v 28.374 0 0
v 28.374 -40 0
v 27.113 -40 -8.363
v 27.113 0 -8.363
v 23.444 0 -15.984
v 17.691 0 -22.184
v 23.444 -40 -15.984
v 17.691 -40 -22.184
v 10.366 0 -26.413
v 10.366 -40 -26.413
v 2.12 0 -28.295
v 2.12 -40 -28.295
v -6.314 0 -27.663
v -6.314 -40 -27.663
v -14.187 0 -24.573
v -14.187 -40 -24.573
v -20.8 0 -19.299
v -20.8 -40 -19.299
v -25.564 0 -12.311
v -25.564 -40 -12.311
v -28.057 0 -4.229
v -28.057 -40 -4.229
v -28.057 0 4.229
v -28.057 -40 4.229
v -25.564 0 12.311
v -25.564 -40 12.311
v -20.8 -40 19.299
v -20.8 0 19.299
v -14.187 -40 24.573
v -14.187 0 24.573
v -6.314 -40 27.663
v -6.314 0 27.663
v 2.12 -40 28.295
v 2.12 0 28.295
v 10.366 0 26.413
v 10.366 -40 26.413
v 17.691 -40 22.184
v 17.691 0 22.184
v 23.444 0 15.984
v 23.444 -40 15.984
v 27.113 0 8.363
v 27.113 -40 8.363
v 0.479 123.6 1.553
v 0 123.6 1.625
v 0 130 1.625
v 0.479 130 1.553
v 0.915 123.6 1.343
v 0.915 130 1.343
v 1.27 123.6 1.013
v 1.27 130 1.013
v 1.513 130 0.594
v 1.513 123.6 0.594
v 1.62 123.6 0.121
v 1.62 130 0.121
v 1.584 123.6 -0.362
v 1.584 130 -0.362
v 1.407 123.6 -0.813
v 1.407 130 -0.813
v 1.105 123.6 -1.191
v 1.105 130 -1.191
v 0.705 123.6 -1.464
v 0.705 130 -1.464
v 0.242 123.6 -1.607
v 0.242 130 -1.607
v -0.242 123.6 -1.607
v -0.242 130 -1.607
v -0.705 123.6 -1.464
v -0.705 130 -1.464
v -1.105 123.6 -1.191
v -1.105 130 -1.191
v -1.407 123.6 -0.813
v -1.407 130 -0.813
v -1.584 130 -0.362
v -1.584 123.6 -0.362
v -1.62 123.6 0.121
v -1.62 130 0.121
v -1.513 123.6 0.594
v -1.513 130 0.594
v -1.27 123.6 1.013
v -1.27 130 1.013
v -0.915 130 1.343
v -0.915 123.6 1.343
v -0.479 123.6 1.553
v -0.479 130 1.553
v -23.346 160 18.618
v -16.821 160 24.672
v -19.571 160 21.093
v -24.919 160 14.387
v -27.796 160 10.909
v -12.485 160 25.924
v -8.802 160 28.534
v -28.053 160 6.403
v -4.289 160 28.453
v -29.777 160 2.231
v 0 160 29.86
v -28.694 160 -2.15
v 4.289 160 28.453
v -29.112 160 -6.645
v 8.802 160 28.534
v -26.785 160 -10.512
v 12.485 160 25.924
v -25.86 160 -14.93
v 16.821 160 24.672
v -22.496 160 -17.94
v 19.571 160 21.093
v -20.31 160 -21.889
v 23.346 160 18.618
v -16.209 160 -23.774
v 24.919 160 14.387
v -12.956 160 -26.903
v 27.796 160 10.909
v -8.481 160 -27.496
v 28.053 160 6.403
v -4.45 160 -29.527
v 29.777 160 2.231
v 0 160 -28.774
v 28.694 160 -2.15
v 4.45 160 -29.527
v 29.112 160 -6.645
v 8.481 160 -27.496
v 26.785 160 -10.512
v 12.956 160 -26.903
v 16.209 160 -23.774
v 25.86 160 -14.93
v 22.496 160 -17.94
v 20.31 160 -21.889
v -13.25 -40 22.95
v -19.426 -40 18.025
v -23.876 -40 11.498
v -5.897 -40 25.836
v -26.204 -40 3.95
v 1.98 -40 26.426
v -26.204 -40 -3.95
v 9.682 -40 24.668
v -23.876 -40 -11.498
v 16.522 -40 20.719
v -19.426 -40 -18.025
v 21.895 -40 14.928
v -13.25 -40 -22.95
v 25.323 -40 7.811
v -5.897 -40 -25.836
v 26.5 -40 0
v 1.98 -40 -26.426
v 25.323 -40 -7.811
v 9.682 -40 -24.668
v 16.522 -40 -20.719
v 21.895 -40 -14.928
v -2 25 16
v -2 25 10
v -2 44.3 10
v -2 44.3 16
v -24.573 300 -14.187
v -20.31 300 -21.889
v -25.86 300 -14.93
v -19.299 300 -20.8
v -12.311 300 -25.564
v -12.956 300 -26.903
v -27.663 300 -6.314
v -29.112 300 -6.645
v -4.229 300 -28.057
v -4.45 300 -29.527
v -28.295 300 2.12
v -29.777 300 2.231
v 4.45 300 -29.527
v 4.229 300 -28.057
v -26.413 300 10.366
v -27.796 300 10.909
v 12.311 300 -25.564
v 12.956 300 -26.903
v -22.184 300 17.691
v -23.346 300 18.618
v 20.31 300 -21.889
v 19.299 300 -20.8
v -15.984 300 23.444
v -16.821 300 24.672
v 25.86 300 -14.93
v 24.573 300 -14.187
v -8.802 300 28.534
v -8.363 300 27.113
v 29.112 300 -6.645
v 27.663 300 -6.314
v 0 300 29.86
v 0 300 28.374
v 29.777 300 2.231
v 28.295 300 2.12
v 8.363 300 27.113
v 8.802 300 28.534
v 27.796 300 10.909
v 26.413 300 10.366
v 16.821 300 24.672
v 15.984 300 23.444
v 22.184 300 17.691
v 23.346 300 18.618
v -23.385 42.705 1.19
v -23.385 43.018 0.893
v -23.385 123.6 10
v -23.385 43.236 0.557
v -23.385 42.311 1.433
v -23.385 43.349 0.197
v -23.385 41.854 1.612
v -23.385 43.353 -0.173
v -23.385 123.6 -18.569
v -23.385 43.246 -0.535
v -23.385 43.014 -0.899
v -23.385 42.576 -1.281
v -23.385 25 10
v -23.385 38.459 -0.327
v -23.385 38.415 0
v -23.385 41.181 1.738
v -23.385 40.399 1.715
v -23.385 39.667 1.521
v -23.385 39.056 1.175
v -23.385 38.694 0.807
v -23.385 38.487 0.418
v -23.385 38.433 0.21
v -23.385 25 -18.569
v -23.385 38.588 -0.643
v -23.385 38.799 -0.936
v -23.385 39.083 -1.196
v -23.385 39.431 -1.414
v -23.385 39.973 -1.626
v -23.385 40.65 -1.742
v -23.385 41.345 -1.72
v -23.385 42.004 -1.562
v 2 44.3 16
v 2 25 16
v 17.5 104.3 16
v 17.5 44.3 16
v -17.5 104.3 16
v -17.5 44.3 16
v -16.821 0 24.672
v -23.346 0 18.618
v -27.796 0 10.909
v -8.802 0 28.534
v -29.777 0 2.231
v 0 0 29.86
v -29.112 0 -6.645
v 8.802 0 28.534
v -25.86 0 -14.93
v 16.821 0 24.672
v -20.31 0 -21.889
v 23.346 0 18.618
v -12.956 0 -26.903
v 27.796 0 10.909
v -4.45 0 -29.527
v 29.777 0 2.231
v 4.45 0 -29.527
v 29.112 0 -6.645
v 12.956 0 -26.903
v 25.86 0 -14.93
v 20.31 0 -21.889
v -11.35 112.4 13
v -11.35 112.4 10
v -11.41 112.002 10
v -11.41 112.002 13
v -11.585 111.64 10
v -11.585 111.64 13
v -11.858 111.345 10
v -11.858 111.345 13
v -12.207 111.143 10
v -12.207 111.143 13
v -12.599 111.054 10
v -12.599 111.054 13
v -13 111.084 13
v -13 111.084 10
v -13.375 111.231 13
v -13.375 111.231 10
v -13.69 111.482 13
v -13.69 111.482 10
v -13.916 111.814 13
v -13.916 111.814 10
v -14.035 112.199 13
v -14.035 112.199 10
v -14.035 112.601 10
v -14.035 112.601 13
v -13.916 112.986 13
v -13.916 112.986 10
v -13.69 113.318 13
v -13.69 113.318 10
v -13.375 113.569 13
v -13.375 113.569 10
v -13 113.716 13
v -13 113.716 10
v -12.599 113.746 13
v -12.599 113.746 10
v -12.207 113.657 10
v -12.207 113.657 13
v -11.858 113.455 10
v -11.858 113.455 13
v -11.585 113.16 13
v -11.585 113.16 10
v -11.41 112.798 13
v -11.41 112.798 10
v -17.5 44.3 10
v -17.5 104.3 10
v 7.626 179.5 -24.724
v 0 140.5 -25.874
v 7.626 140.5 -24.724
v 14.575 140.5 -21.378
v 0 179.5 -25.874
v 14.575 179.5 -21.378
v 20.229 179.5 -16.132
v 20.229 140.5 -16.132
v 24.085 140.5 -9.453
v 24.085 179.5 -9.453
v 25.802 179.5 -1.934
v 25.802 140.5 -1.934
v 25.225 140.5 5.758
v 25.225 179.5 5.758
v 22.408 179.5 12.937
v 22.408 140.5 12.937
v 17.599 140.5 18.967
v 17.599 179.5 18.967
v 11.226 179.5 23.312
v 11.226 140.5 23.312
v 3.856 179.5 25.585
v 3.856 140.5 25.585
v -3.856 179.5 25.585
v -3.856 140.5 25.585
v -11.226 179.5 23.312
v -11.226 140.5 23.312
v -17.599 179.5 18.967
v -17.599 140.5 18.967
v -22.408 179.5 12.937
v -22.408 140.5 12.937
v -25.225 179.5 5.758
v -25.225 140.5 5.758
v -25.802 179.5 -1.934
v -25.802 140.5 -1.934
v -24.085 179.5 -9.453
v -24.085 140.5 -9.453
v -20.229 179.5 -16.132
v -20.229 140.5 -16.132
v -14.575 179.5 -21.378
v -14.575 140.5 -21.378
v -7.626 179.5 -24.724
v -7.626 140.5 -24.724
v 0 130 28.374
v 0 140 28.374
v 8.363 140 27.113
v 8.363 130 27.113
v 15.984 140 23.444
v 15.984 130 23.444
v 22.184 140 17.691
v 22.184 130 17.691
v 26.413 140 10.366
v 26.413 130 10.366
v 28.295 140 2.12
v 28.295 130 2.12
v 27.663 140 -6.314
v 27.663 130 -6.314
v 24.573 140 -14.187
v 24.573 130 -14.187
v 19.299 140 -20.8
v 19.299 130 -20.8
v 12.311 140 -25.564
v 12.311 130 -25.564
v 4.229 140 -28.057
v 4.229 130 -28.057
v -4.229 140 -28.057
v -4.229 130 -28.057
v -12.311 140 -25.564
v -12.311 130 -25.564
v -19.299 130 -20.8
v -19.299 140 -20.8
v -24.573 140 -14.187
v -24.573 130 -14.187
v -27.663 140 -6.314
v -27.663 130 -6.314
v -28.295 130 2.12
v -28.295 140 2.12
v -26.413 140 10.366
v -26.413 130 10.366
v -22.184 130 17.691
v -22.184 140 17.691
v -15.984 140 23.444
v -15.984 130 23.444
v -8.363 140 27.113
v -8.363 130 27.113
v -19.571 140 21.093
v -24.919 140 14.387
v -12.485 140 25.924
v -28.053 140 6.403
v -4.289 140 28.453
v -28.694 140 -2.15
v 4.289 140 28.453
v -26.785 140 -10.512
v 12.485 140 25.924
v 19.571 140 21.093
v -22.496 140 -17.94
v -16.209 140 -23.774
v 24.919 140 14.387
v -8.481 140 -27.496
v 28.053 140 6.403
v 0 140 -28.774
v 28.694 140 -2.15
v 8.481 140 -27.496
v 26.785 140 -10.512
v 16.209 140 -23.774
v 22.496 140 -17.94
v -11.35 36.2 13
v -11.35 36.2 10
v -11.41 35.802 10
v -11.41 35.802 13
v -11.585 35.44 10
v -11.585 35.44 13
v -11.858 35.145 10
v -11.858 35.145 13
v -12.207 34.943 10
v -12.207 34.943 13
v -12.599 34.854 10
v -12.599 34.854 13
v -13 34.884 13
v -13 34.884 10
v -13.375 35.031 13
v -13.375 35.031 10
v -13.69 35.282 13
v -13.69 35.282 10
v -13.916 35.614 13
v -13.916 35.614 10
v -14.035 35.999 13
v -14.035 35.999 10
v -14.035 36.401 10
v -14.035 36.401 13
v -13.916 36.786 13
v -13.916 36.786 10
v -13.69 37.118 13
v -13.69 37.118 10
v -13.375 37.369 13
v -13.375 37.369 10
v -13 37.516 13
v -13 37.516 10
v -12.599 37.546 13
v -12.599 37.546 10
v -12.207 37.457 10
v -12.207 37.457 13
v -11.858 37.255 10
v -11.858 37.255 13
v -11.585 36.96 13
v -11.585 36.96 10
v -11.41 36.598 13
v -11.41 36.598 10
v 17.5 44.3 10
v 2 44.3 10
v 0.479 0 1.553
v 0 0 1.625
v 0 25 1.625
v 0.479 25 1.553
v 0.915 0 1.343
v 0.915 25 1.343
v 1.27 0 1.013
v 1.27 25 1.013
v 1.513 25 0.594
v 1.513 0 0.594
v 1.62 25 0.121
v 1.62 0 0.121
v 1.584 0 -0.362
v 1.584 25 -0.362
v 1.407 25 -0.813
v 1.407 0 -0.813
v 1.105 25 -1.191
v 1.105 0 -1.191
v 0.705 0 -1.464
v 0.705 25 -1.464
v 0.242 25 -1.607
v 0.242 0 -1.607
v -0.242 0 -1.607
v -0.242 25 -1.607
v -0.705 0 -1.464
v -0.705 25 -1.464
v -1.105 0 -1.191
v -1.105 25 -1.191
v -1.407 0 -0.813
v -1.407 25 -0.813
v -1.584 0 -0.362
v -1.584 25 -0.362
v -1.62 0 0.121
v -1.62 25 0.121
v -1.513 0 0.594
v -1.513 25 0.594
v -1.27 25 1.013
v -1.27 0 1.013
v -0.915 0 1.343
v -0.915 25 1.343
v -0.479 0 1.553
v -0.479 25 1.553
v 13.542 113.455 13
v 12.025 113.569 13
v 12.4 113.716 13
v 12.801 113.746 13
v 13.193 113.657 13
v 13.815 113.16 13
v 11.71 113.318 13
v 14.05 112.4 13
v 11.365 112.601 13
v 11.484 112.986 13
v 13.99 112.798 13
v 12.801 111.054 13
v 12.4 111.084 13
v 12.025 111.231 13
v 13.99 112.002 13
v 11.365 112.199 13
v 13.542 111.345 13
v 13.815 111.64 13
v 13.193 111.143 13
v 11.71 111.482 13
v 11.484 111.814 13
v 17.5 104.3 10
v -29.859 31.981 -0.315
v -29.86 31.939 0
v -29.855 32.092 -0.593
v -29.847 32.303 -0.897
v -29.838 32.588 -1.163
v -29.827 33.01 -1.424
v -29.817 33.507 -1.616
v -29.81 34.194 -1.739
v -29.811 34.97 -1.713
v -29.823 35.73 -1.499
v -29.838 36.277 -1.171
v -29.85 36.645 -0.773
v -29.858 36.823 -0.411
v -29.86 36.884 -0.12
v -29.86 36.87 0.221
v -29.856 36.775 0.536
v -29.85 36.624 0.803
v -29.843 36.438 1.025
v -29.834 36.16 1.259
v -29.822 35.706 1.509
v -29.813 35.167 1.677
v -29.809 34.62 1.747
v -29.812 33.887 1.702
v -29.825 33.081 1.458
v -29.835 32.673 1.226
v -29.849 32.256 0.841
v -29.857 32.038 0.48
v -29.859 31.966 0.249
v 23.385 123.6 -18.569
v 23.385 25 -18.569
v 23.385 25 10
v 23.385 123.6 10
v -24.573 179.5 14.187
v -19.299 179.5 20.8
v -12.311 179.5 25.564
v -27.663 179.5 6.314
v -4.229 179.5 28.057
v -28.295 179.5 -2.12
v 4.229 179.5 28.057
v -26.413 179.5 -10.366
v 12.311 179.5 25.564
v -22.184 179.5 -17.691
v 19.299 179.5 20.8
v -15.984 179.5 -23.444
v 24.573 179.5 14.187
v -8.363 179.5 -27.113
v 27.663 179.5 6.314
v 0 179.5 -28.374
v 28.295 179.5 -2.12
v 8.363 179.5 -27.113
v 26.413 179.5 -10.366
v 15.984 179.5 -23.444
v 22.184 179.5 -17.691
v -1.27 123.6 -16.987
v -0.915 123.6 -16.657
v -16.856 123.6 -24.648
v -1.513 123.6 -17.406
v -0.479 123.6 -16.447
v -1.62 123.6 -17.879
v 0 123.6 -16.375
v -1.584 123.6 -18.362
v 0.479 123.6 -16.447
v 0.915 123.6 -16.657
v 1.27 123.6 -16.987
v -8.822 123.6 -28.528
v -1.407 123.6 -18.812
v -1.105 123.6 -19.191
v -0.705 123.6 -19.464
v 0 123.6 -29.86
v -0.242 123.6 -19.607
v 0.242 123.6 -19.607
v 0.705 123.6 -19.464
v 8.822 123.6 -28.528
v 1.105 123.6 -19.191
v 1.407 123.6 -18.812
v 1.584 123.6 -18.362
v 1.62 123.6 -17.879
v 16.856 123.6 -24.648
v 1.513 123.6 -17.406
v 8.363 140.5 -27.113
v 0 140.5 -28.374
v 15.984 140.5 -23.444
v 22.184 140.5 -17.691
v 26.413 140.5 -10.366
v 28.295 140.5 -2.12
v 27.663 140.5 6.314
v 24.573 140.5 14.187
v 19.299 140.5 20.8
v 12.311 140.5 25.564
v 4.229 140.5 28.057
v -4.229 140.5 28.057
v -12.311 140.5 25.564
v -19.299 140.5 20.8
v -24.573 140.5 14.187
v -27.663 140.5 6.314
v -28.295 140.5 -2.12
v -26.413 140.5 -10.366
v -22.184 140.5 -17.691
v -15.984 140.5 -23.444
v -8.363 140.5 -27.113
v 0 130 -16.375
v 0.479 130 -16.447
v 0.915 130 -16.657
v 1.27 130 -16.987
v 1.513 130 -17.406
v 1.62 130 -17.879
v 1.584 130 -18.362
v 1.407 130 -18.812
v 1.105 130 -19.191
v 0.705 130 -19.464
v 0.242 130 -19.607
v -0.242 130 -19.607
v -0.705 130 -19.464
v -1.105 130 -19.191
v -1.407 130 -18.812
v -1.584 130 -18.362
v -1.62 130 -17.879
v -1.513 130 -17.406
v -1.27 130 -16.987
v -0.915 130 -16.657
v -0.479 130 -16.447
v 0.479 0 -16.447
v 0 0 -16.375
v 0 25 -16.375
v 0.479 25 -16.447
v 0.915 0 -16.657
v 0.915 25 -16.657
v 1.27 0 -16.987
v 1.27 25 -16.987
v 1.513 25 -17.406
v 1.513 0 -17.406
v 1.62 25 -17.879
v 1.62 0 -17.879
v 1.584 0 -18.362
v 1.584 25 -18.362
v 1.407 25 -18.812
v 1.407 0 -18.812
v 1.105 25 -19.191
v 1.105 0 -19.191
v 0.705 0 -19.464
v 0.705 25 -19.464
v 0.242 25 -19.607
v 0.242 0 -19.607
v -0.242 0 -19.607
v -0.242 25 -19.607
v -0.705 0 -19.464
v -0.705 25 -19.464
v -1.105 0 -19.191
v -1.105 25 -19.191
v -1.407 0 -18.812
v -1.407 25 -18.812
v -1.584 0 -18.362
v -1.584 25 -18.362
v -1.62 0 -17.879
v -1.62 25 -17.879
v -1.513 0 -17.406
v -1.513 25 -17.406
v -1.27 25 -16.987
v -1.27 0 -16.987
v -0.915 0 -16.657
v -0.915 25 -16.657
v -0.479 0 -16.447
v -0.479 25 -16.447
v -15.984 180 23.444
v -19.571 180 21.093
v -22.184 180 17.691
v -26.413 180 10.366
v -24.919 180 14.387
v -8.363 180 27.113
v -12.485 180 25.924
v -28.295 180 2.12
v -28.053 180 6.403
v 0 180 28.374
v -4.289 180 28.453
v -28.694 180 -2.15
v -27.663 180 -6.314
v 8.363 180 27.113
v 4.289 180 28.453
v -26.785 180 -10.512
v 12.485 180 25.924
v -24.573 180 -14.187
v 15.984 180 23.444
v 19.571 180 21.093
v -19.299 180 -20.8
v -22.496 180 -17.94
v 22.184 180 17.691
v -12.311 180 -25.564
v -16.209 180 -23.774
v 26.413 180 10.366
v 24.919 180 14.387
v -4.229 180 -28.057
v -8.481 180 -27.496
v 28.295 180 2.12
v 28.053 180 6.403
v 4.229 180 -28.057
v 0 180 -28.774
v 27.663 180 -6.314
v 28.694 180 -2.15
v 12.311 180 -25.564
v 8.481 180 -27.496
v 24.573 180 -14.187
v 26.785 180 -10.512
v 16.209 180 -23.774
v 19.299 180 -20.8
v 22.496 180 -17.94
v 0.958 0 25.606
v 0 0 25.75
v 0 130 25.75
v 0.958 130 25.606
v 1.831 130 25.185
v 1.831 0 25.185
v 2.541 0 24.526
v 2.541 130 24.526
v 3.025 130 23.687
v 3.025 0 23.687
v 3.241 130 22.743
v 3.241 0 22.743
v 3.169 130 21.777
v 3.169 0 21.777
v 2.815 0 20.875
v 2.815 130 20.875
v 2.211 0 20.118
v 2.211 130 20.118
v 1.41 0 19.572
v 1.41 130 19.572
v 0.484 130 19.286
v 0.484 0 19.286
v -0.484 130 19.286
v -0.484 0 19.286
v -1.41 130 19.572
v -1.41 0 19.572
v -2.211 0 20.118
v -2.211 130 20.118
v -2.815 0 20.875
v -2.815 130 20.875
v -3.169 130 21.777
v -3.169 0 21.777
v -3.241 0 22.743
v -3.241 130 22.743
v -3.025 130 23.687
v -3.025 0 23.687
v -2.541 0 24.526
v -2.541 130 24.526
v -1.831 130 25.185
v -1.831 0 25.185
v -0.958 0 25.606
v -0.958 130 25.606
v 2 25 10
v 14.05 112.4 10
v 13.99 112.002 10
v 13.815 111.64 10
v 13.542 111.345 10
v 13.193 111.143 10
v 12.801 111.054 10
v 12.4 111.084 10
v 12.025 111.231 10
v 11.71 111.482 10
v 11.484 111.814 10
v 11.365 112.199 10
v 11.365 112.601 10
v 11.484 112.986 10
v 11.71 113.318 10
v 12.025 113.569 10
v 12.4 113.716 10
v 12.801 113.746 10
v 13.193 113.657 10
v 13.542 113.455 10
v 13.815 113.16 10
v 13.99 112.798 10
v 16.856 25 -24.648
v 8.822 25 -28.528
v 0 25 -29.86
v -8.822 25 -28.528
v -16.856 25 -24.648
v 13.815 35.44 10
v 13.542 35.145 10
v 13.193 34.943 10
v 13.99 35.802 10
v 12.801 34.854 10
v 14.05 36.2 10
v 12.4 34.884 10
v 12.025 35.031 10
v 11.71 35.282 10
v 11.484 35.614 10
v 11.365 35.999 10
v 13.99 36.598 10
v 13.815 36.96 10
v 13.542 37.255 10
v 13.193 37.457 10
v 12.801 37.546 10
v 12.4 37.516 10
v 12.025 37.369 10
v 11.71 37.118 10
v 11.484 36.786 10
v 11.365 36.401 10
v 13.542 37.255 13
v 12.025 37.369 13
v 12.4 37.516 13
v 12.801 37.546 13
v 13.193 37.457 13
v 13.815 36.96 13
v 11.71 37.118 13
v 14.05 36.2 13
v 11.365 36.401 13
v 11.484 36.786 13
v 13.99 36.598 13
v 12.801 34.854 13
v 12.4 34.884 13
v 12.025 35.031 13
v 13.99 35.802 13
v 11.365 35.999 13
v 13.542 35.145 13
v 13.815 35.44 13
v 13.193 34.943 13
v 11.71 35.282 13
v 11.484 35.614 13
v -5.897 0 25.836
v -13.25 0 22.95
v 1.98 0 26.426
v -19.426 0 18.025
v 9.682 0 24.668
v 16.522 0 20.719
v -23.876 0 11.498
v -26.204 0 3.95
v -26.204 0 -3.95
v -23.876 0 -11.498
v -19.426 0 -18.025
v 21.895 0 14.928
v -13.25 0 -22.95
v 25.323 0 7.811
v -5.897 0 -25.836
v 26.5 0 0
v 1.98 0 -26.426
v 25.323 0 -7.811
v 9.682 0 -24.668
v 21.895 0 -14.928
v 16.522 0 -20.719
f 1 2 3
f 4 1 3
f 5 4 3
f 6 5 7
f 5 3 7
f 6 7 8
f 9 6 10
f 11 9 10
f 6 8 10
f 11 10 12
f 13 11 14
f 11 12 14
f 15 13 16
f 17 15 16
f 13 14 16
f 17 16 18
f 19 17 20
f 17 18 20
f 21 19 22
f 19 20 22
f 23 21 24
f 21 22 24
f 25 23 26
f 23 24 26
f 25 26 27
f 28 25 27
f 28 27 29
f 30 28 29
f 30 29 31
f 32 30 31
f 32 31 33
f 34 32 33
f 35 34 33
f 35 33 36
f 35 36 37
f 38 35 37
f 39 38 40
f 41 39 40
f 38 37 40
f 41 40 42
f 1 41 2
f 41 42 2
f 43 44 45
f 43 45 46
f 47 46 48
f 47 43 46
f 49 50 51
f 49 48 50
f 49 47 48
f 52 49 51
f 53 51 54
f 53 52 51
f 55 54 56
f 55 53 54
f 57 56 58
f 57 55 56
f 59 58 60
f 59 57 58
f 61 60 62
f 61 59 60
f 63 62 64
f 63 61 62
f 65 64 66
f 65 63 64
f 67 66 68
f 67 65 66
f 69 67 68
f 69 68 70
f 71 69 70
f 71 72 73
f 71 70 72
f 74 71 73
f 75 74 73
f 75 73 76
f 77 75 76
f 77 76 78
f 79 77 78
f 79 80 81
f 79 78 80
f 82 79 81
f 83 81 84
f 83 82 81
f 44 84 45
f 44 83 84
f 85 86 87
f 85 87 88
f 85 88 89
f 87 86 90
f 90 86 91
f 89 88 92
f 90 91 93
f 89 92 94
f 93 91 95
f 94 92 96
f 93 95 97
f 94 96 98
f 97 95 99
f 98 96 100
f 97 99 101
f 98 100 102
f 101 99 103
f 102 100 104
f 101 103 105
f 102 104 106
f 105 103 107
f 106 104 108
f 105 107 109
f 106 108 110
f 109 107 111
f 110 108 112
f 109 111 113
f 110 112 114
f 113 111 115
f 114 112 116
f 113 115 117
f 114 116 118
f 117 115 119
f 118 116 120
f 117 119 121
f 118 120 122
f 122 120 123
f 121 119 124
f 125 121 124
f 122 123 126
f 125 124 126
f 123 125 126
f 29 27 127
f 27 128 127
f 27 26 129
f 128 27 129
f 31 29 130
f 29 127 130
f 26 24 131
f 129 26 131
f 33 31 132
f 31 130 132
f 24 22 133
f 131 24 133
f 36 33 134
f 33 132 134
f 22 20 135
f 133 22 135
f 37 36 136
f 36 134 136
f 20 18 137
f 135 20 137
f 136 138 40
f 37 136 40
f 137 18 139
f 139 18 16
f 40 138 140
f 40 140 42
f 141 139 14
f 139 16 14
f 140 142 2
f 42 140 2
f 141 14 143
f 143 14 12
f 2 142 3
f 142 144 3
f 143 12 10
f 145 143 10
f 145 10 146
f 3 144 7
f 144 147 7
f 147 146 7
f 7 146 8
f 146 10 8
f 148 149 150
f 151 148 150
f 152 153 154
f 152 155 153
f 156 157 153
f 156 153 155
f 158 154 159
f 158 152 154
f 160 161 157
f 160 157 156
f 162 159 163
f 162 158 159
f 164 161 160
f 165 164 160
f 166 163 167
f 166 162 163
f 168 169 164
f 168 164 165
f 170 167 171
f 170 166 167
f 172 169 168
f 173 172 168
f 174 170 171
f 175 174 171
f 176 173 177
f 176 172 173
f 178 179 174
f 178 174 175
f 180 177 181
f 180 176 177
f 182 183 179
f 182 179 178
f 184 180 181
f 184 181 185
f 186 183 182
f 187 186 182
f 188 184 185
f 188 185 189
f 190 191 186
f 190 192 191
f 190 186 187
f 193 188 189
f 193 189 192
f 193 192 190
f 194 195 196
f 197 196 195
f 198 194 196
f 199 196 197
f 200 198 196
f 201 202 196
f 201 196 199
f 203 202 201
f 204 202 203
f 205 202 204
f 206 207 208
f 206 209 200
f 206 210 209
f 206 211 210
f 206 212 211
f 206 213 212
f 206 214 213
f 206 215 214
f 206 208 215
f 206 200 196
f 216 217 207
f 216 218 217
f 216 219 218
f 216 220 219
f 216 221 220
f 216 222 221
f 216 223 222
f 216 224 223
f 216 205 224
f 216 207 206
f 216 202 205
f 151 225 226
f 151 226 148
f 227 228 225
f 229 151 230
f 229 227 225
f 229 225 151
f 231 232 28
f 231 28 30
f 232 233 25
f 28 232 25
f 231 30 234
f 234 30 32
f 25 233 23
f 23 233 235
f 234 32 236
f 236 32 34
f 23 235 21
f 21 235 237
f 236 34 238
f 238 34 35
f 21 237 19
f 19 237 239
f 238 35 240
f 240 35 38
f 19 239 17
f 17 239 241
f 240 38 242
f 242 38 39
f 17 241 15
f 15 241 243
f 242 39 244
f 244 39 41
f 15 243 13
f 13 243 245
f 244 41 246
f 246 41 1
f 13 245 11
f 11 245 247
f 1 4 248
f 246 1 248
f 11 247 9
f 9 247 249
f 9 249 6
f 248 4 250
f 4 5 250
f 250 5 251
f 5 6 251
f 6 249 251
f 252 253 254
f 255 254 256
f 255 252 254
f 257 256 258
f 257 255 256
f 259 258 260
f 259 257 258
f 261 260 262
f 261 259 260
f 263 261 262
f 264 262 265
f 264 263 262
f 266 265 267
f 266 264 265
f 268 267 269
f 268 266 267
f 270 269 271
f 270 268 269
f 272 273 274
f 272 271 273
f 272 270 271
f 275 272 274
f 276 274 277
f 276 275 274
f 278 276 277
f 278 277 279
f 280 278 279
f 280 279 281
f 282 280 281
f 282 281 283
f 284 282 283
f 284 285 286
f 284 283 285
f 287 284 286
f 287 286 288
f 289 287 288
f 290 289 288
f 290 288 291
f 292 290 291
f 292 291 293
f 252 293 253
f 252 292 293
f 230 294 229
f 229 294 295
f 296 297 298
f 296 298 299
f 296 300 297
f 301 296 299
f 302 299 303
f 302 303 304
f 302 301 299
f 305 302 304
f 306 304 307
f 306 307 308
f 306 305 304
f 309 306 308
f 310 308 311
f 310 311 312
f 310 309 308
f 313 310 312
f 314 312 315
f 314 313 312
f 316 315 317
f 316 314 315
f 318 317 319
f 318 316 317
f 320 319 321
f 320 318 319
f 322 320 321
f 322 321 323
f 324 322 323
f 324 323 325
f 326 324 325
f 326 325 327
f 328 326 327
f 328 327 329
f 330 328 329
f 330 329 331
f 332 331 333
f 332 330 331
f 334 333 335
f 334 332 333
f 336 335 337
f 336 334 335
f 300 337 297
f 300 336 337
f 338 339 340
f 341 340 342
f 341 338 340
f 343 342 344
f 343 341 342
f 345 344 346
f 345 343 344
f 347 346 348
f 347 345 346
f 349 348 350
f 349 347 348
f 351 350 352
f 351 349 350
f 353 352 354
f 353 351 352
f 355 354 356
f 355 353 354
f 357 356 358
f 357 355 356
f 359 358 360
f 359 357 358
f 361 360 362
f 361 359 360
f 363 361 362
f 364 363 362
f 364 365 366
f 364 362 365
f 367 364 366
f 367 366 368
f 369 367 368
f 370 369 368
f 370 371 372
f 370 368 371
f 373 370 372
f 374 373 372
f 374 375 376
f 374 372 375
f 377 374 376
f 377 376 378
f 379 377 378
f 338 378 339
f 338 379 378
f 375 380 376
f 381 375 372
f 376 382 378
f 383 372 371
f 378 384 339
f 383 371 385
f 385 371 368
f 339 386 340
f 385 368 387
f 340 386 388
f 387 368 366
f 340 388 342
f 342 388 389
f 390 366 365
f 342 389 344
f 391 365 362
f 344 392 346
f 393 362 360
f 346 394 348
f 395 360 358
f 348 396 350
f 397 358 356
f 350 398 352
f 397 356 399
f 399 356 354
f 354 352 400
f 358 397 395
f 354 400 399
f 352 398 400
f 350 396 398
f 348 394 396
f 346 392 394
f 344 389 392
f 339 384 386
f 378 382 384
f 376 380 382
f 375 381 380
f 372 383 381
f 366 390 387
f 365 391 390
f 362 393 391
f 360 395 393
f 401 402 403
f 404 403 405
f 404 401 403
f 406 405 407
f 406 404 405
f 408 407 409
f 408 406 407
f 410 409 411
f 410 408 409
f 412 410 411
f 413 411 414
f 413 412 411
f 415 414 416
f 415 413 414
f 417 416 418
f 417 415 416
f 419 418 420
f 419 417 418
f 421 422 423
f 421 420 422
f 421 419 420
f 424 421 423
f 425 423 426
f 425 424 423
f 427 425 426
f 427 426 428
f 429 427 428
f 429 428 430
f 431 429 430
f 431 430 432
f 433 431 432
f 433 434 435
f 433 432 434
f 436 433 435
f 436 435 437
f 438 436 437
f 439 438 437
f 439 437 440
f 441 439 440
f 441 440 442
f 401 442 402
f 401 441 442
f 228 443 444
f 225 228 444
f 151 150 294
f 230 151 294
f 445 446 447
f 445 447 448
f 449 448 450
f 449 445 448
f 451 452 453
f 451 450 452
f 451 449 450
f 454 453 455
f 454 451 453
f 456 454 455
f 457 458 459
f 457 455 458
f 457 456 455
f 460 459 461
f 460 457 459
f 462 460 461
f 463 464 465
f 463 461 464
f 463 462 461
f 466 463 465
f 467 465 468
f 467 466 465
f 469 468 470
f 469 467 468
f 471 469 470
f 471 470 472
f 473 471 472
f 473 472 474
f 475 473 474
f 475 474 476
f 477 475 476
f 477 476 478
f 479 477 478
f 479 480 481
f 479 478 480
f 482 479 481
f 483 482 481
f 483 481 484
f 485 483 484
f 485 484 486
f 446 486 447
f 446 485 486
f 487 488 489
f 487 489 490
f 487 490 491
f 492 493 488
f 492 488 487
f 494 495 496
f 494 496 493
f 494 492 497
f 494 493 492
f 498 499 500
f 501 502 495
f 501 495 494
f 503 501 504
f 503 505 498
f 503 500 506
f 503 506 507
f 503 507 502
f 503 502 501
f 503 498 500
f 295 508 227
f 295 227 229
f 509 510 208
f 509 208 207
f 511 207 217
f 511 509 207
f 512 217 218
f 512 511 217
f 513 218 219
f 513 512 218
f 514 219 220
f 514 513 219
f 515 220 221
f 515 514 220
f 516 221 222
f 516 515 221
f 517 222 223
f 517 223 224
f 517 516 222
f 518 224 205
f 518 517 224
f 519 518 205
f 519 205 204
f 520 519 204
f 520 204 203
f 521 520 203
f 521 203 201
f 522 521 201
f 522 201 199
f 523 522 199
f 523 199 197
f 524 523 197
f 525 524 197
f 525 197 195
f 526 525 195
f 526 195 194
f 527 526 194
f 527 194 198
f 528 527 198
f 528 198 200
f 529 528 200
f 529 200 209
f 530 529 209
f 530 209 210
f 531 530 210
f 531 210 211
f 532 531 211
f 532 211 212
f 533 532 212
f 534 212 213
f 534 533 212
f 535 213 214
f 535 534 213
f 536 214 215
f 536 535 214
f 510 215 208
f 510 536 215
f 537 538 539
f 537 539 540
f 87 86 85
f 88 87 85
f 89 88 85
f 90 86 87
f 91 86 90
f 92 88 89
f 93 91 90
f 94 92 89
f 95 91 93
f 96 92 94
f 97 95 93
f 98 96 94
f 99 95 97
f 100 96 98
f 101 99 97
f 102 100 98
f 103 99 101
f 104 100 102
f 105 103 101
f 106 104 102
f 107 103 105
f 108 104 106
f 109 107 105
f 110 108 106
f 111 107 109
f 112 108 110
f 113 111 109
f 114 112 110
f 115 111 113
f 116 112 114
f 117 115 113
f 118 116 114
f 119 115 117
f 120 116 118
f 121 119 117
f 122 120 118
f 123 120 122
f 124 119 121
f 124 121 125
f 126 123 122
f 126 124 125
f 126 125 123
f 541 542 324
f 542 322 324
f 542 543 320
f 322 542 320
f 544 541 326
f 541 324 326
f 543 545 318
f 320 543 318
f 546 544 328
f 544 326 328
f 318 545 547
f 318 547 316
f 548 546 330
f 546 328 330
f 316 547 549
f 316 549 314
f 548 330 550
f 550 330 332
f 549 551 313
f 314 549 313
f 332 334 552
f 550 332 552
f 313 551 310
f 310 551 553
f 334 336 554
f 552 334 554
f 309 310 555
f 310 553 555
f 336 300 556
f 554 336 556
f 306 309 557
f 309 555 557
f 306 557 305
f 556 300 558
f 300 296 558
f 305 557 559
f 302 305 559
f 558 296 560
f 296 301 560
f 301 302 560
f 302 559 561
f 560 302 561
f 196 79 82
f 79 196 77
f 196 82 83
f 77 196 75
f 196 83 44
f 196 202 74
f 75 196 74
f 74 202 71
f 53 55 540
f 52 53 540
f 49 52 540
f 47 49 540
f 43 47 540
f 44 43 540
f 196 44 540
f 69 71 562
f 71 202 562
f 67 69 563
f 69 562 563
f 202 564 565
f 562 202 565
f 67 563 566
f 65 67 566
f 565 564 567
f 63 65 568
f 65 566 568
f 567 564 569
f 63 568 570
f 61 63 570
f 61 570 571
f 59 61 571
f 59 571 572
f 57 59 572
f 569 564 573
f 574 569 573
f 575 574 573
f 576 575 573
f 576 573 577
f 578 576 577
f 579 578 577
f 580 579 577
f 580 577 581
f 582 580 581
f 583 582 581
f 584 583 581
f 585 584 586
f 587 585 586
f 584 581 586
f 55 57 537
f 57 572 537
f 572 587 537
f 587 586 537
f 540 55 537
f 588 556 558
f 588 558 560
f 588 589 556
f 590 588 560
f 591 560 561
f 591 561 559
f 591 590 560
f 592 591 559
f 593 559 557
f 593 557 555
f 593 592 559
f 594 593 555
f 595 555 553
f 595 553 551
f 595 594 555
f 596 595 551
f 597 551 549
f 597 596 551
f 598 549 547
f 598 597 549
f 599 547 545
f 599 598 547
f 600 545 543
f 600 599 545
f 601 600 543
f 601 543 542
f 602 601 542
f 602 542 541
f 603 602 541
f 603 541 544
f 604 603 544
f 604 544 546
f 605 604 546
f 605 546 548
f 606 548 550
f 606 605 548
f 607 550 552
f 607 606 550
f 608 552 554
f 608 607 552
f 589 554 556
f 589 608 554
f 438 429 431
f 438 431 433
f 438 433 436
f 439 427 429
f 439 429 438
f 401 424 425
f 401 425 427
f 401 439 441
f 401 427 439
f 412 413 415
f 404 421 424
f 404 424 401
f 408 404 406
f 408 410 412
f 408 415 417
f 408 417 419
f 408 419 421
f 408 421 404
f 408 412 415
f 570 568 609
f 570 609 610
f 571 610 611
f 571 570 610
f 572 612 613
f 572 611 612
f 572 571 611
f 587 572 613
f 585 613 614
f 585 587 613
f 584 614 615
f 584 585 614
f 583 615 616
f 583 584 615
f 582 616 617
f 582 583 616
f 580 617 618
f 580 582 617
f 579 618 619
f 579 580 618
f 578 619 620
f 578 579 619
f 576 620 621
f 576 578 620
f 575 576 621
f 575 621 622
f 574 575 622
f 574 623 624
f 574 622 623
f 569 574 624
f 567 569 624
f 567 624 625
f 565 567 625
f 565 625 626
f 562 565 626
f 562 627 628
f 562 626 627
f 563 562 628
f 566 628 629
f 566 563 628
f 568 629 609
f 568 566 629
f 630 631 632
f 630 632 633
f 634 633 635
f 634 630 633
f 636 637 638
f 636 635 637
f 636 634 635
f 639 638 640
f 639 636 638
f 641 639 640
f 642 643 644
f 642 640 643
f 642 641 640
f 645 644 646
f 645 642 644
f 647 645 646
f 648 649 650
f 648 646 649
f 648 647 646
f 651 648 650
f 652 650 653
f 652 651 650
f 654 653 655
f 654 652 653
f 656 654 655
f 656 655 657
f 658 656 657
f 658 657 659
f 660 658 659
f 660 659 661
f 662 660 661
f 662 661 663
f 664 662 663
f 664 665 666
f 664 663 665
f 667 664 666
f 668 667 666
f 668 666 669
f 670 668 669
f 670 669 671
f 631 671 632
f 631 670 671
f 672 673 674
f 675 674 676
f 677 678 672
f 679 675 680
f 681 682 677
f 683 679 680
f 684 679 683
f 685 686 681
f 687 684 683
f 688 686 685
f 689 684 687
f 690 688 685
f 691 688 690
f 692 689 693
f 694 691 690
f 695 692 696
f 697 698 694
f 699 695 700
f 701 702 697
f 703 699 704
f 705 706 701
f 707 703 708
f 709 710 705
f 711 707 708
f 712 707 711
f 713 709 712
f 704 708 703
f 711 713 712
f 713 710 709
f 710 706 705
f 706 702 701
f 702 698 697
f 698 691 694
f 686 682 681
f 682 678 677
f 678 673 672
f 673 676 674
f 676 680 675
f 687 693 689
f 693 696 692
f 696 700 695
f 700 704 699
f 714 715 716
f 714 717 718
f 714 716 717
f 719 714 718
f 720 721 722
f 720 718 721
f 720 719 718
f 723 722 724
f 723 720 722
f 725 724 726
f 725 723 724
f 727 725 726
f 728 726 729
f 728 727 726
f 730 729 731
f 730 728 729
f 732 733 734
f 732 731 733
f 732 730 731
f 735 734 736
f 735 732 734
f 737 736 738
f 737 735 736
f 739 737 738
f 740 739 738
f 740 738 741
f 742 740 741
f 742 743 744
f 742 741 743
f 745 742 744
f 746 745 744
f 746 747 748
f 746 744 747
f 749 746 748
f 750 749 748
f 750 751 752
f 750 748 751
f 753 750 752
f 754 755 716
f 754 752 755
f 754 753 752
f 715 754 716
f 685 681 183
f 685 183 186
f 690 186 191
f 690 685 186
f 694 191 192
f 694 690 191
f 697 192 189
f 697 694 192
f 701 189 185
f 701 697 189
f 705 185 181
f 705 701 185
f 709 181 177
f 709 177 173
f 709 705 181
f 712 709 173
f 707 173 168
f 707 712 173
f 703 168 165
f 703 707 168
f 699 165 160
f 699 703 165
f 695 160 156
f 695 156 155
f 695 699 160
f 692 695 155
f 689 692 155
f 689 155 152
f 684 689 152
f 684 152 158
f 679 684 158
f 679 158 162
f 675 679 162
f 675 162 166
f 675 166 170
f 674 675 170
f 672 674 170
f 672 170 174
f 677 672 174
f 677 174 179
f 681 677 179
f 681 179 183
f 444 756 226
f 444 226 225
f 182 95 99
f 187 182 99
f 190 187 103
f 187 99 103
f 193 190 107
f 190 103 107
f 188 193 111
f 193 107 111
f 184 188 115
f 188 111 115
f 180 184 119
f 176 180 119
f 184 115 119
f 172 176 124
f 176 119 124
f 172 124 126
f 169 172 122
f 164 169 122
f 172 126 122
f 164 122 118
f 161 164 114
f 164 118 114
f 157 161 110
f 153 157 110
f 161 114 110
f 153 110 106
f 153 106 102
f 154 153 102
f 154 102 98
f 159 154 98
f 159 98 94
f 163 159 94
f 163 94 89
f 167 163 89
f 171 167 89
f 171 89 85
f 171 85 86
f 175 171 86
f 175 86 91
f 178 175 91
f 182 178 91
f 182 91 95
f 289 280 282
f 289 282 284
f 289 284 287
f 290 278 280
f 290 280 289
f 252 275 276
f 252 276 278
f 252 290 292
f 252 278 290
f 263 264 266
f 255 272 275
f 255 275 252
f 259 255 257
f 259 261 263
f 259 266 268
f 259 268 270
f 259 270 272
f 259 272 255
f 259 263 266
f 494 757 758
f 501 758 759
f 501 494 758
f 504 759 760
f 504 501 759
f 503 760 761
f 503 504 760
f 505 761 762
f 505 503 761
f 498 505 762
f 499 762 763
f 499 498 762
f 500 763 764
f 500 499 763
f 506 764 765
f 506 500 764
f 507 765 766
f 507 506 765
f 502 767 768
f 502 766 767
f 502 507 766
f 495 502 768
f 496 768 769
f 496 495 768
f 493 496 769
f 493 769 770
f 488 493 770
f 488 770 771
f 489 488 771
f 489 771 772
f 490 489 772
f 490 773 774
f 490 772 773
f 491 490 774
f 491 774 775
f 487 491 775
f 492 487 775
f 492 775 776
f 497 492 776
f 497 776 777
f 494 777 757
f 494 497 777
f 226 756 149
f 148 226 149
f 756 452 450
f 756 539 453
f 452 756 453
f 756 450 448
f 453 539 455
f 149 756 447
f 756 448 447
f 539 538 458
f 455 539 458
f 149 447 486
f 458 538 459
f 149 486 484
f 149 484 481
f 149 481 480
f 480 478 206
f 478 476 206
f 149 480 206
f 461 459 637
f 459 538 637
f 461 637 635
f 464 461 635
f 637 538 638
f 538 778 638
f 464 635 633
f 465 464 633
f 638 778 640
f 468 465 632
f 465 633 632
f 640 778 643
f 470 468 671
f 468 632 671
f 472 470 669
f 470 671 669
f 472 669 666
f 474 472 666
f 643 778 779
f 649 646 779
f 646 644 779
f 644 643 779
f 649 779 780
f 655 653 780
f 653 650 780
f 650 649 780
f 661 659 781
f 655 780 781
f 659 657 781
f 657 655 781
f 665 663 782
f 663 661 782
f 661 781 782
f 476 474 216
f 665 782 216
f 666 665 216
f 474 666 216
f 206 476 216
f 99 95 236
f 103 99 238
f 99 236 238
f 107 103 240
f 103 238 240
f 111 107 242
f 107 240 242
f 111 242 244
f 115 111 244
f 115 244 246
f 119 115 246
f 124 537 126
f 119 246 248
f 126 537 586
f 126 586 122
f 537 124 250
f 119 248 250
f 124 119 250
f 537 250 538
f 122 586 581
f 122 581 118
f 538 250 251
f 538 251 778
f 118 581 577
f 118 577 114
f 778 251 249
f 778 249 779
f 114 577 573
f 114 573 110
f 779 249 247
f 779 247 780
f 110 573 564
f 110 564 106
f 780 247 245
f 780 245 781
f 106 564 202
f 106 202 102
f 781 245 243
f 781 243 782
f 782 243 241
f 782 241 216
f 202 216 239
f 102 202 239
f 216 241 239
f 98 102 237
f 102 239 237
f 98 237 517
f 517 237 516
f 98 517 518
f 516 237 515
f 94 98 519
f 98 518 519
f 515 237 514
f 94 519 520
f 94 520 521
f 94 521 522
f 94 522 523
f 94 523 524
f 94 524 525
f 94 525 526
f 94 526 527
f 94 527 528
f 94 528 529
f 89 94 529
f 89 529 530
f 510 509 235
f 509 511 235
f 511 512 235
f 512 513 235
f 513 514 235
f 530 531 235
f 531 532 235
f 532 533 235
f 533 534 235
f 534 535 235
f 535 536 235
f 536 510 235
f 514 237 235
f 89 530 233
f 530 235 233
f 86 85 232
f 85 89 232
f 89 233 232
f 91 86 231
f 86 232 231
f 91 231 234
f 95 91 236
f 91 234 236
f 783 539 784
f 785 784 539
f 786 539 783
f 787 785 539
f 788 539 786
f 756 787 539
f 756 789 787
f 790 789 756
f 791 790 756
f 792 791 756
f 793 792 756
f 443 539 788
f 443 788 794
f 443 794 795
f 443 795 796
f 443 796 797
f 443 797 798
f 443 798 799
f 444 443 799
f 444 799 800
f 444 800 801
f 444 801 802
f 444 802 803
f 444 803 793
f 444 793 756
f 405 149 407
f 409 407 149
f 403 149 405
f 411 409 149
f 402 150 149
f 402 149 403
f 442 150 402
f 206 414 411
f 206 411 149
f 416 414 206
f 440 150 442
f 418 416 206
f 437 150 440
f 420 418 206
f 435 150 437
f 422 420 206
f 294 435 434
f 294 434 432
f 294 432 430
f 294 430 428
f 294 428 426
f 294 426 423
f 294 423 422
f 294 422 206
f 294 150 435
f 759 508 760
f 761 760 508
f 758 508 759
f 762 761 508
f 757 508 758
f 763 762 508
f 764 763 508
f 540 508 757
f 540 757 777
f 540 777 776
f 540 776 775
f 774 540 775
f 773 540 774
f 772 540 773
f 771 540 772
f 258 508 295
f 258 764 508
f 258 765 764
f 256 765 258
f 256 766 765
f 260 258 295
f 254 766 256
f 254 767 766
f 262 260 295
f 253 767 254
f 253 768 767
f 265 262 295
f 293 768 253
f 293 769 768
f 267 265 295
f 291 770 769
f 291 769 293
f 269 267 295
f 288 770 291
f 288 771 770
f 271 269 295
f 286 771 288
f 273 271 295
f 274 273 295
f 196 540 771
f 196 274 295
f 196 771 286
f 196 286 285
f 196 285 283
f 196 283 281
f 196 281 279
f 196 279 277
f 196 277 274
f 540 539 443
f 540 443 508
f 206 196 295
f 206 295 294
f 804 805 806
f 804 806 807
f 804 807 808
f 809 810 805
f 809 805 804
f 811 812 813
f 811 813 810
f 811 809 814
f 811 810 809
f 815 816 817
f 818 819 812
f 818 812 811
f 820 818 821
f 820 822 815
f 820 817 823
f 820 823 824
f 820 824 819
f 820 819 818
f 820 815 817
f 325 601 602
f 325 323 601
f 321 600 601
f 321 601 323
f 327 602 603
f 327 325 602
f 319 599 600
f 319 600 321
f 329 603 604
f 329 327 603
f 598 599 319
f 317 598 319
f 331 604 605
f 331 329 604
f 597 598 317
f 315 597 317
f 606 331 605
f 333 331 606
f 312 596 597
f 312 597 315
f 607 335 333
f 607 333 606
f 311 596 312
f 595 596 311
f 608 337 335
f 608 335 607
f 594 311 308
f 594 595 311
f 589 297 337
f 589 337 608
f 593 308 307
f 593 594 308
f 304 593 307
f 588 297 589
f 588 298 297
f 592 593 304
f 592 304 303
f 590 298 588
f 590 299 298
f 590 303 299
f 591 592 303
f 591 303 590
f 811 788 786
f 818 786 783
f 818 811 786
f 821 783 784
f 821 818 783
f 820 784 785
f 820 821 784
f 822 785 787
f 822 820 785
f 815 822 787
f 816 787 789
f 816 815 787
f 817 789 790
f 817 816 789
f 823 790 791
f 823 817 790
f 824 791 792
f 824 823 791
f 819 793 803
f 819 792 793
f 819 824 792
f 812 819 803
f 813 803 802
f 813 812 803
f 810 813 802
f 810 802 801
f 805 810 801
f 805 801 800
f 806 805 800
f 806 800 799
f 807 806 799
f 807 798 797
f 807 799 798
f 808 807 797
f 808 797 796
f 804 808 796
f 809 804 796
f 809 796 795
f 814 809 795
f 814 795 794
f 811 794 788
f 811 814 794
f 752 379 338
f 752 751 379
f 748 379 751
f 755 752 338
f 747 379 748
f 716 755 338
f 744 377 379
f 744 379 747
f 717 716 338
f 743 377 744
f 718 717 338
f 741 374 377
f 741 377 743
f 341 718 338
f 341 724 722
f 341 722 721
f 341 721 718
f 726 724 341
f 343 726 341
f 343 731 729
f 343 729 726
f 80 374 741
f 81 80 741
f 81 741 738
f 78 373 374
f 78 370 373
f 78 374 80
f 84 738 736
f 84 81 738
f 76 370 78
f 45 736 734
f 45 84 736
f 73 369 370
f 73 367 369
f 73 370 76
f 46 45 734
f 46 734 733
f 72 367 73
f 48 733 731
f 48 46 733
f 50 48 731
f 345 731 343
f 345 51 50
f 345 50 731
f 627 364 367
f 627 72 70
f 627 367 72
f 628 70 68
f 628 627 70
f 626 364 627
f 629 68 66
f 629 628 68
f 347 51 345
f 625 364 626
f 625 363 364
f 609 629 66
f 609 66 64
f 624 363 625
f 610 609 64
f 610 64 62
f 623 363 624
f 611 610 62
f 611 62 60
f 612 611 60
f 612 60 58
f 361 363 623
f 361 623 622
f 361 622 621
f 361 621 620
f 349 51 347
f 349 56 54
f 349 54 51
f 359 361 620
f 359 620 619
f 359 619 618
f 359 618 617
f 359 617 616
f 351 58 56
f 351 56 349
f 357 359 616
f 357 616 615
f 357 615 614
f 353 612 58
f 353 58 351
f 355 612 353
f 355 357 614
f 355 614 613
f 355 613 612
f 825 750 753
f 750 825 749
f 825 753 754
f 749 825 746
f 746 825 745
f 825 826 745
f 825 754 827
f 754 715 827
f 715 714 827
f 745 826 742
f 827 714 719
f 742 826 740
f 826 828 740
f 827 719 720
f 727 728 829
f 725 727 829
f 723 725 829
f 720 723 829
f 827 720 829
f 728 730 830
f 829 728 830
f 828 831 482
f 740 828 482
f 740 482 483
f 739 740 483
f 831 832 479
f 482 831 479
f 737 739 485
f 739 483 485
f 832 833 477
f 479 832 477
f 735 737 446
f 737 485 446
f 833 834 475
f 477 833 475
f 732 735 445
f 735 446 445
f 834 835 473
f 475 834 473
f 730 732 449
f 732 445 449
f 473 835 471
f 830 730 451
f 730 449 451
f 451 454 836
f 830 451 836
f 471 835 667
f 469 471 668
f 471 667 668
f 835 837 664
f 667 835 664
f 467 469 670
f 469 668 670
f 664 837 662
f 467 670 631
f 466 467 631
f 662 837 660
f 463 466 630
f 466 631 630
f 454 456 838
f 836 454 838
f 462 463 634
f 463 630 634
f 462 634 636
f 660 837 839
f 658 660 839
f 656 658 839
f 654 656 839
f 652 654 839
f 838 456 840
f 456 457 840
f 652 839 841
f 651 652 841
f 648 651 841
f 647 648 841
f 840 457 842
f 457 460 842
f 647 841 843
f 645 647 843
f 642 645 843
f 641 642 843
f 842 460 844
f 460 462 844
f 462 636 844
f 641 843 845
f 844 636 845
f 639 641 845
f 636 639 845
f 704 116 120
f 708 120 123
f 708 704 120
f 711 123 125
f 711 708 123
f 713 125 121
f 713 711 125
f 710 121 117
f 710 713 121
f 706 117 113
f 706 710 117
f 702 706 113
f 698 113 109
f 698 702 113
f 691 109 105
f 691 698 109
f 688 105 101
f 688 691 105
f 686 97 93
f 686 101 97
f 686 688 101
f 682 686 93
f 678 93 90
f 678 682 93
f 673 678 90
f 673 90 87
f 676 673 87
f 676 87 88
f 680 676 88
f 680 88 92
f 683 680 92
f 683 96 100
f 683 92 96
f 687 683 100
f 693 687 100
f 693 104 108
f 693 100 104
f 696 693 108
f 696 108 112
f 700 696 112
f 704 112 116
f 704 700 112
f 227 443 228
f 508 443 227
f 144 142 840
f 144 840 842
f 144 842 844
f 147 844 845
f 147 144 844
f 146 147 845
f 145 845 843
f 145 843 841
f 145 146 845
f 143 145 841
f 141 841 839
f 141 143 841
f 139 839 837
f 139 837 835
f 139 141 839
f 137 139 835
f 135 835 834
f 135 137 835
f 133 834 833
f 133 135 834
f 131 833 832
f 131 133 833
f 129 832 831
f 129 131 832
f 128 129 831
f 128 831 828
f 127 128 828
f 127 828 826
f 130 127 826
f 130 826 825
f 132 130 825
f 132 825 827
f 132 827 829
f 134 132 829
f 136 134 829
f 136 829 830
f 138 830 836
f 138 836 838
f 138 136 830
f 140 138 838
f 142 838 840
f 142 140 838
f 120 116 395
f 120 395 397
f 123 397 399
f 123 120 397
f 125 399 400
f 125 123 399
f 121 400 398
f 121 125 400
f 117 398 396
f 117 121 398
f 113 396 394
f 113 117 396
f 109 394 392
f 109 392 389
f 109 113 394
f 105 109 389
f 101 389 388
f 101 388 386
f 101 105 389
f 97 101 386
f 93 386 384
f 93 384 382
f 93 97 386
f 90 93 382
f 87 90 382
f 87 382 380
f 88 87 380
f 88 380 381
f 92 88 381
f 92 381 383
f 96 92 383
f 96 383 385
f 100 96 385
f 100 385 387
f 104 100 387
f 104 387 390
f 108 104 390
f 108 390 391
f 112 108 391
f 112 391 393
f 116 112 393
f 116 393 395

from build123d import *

# Parameters (mm, degrees)
DIAMETERS_IN_R                        = 29.8605
DIAMETERS_IN_R_2                      = 28.374
RECOVERY_BAY_DEPTH                    = 300
WHAT_OUTLINE_R                        = 28.374
WHAT_DEPTH                            = 130
BOSS_EXTRUDE3_START                   = -40
BOSS_EXTRUDE3_OUTLINE_R               = 28.374
BOSS_EXTRUDE3_OUTLINE_R_2             = 26.5
BOSS_EXTRUDE3_DEPTH                   = 40
CUT_EXTRUDE1_DEPTH                    = 10
CUT_EXTRUDE1_DEPTH_BACK               = 40
WIREPASSTHROUGH1_DEPTH                = 176.166489148
WIREPASSTHROUGH1_DEPTH_BACK           = 176.166489148
SKETCH3_R                             = 3.25
WIREPASSTHROUGH2_DEPTH                = 176.166489148
WIREPASSTHROUGH2_DEPTH_BACK           = 176.166489148
SKETCH5_R                             = 1.625
SKETCH9_W                             = 35
SKETCH9_H                             = 60
SKETCH9_W_2                           = 4
SKETCH9_H_2                           = 19.3
BATTERYPOCKET_DEPTH                   = 6
ATMOSPHERIC_SAMPLING_PORT_REACH       = 304.239
SKETCH10_R                            = 1.75
INCOMPREHENSIBLE7_DEPTH               = 20
INCOMPREHENSIBLE7_DEPTH_BACK          = 20
SKETCH11_R                            = 28.774
SKETCH11_R_2                          = 28.374
SKETCH12_R                            = 28.374
SKETCH12_R_2                          = 25.874
CHUTE_COUPLER_DEPTH                   = 19.5
M3_THREADED_INSERT_POCKETS_DEPTH      = 305.106081712
M3_THREADED_INSERT_POCKETS_DEPTH_BACK = 3
SKETCH15_R                            = 1.35


# Read off the part's stored shape, not the designer's step: what, Boss-Extrude3
with BuildPart() as part:
    # diameters-in → recovery-bay (new body)
    with BuildSketch(Plane(origin=(0, 0, 0), x_dir=(1, 0, 0), z_dir=(0, 1, 0))):
        with Locations(Location((0, 0, 0), (0, 0, 270))):
            Circle(DIAMETERS_IN_R)
        with Locations(Location((0, 0, 0), (0, 0, 270))):
            Circle(DIAMETERS_IN_R_2, mode=Mode.SUBTRACT)
    extrude(amount=RECOVERY_BAY_DEPTH)

    # what outline → what (add)
    with BuildSketch(Plane(origin=(0, 0, 0), x_dir=(1, 0, 0), z_dir=(0, 1, 0))):
        Circle(WHAT_OUTLINE_R)
    extrude(amount=WHAT_DEPTH)

    # Boss-Extrude3 outline → Boss-Extrude3 (add)
    with BuildSketch(Plane(origin=(0, 0, 0), x_dir=(1, 0, 0), z_dir=(0, 1, 0)).offset(BOSS_EXTRUDE3_START)):
        Circle(BOSS_EXTRUDE3_OUTLINE_R)
        Circle(BOSS_EXTRUDE3_OUTLINE_R_2, mode=Mode.SUBTRACT)
    extrude(amount=BOSS_EXTRUDE3_DEPTH)

    # Sketch2 → Cut-Extrude1 (cut, two sides: drawn at the far end of the back side and taken through both)
    with BuildSketch(Plane.XY.offset(-CUT_EXTRUDE1_DEPTH_BACK)):
        Polygon((23.385, 109.475), (23.385, 106.975), (23.385, 41.625), (23.385, 39.125), (23.385, 25), (-23.385, 25), (-23.385, 39.125), (-23.385, 41.625), (-23.385, 106.975), (-23.385, 109.475), (-23.385, 123.6), (23.385, 123.6), align=None)
    extrude(amount=CUT_EXTRUDE1_DEPTH + CUT_EXTRUDE1_DEPTH_BACK, mode=Mode.SUBTRACT)

    # Sketch3 → wirepassthrough1 (cut, two sides: drawn at the far end of the back side and taken through both)
    with BuildSketch(Plane(origin=(0, 130, 0), x_dir=(1, 0, 0), z_dir=(0, 1, 0)).offset(-WIREPASSTHROUGH1_DEPTH_BACK)):
        with Locations(Location((0, -22.5, 0), (0, 0, 270))):
            Circle(SKETCH3_R)
    extrude(amount=WIREPASSTHROUGH1_DEPTH + WIREPASSTHROUGH1_DEPTH_BACK, mode=Mode.SUBTRACT)

    # Sketch5 → wirepassthrough2 (cut, two sides: drawn at the far end of the back side and taken through both)
    with BuildSketch(Plane(origin=(0, 130, 0), x_dir=(1, 0, 0), z_dir=(0, 1, 0)).offset(-WIREPASSTHROUGH2_DEPTH_BACK)):
        with Locations(Location((0, 18, 0), (0, 0, 270))):
            Circle(SKETCH5_R)
        with Locations(Location((0, 0, 0), (0, 0, 270))):
            Circle(SKETCH5_R)
    extrude(amount=WIREPASSTHROUGH2_DEPTH + WIREPASSTHROUGH2_DEPTH_BACK, mode=Mode.SUBTRACT)

    # Sketch9 → batterypocket (cut)
    with BuildSketch(Plane(origin=(0, 0, 10), x_dir=(-1, 0, 0), z_dir=(0, 0, -1))):
        with Locations((0, 74.3)):
            Rectangle(SKETCH9_W, SKETCH9_H)
        with Locations((0, 34.65)):
            Rectangle(SKETCH9_W_2, SKETCH9_H_2)
    extrude(amount=-BATTERYPOCKET_DEPTH, mode=Mode.SUBTRACT)

    # atmospheric-sampling-port: up to this plane
    atmospheric_sampling_port_end = Plane(origin=(-23.385, 0, 10), z_dir=(1, 0, 0))
    # Sketch10 → atmospheric-sampling-port (cut, up to the surface)
    with BuildSketch(Plane(origin=(0.8075, 0.8075, 0), x_dir=(0, 0, -1), z_dir=(0.7071067811865488, 0.7071067811865464, 0)), mode=Mode.PRIVATE) as atmospheric_sampling_port_sk1:
        with Locations(Location((0, 45.449199077, 0), (0, 0, 270))):
            Circle(SKETCH10_R)
    atmospheric_sampling_port_tool1 = split(extrude(atmospheric_sampling_port_sk1.sketch, amount=ATMOSPHERIC_SAMPLING_PORT_REACH, mode=Mode.PRIVATE), bisect_by=atmospheric_sampling_port_end, keep=Keep.BOTH, mode=Mode.PRIVATE)
    add(atmospheric_sampling_port_tool1.solids().sort_by_distance((-31.329937, 32.944937, 0))[0], mode=Mode.SUBTRACT)


with BuildPart() as body_2:
    # Split1: the piece on the far side of the plane
    add(part.part)
    split(bisect_by=Plane(origin=(0, 160, 0), x_dir=(0, 0, -1), z_dir=(0, -1, 0)), keep=Keep.BOTTOM)


with BuildPart() as part_1:
    add(part.part)

    # Split1
    split(bisect_by=Plane(origin=(0, 160, 0), x_dir=(0, 0, -1), z_dir=(0, -1, 0)), keep=Keep.TOP)


with BuildPart() as incomprehensible7_tool:
    # Sketch11 → incomprehensible7 (new, two sides: drawn at the far end of the back side and taken through both)
    with BuildSketch(Plane(origin=(0, 160, 0), x_dir=(-1, 0, 0), z_dir=(0, -1, 0)).offset(-INCOMPREHENSIBLE7_DEPTH_BACK)):
        with Locations(Location((0, 0, 0), (0, 0, 90))):
            Circle(SKETCH11_R)
        with Locations(Location((0, 0, 0), (0, 0, 90))):
            Circle(SKETCH11_R_2, mode=Mode.SUBTRACT)
    extrude(amount=INCOMPREHENSIBLE7_DEPTH + INCOMPREHENSIBLE7_DEPTH_BACK)


with BuildPart() as part_2:
    add(part_1.part)

    # incomprehensible7: cut by incomprehensible7_tool
    add(incomprehensible7_tool.part, mode=Mode.SUBTRACT)

    # Sketch15 → m3-threaded-insert-pockets (cut, two sides: drawn at the far end of the back side and taken through both)
    with BuildSketch(Plane(origin=(0, 0, 10), x_dir=(-1, 0, 0), z_dir=(0, 0, -1)).offset(-M3_THREADED_INSERT_POCKETS_DEPTH_BACK)):
        with Locations(Location((-12.7, 112.4, 0), (0, 0, 180))):
            Circle(SKETCH15_R)
        with Locations(Location((12.7, 112.4, 0), (0, 0, 180))):
            Circle(SKETCH15_R)
        with Locations(Location((-12.7, 36.2, 0), (0, 0, 180))):
            Circle(SKETCH15_R)
        with Locations(Location((12.7, 36.2, 0), (0, 0, 180))):
            Circle(SKETCH15_R)
    extrude(amount=M3_THREADED_INSERT_POCKETS_DEPTH + M3_THREADED_INSERT_POCKETS_DEPTH_BACK, mode=Mode.SUBTRACT)


with BuildPart() as body_2_1:
    add(body_2.part)

    # incomprehensible7: cut by incomprehensible7_tool
    add(incomprehensible7_tool.part, mode=Mode.SUBTRACT)


with BuildPart() as body_3:
    # Sketch12 → chute-coupler (new, symmetric)
    with BuildSketch(Plane(origin=(0, 160, 0), x_dir=(-1, 0, 0), z_dir=(0, -1, 0))):
        with Locations(Location((0, 0, 0), (0, 0, 90))):
            Circle(SKETCH12_R)
        with Locations(Location((0, 0, 0), (0, 0, 90))):
            Circle(SKETCH12_R_2, mode=Mode.SUBTRACT)
    extrude(amount=CHUTE_COUPLER_DEPTH, both=True)


solid = Compound([part_2.part, body_2_1.part, body_3.part])
